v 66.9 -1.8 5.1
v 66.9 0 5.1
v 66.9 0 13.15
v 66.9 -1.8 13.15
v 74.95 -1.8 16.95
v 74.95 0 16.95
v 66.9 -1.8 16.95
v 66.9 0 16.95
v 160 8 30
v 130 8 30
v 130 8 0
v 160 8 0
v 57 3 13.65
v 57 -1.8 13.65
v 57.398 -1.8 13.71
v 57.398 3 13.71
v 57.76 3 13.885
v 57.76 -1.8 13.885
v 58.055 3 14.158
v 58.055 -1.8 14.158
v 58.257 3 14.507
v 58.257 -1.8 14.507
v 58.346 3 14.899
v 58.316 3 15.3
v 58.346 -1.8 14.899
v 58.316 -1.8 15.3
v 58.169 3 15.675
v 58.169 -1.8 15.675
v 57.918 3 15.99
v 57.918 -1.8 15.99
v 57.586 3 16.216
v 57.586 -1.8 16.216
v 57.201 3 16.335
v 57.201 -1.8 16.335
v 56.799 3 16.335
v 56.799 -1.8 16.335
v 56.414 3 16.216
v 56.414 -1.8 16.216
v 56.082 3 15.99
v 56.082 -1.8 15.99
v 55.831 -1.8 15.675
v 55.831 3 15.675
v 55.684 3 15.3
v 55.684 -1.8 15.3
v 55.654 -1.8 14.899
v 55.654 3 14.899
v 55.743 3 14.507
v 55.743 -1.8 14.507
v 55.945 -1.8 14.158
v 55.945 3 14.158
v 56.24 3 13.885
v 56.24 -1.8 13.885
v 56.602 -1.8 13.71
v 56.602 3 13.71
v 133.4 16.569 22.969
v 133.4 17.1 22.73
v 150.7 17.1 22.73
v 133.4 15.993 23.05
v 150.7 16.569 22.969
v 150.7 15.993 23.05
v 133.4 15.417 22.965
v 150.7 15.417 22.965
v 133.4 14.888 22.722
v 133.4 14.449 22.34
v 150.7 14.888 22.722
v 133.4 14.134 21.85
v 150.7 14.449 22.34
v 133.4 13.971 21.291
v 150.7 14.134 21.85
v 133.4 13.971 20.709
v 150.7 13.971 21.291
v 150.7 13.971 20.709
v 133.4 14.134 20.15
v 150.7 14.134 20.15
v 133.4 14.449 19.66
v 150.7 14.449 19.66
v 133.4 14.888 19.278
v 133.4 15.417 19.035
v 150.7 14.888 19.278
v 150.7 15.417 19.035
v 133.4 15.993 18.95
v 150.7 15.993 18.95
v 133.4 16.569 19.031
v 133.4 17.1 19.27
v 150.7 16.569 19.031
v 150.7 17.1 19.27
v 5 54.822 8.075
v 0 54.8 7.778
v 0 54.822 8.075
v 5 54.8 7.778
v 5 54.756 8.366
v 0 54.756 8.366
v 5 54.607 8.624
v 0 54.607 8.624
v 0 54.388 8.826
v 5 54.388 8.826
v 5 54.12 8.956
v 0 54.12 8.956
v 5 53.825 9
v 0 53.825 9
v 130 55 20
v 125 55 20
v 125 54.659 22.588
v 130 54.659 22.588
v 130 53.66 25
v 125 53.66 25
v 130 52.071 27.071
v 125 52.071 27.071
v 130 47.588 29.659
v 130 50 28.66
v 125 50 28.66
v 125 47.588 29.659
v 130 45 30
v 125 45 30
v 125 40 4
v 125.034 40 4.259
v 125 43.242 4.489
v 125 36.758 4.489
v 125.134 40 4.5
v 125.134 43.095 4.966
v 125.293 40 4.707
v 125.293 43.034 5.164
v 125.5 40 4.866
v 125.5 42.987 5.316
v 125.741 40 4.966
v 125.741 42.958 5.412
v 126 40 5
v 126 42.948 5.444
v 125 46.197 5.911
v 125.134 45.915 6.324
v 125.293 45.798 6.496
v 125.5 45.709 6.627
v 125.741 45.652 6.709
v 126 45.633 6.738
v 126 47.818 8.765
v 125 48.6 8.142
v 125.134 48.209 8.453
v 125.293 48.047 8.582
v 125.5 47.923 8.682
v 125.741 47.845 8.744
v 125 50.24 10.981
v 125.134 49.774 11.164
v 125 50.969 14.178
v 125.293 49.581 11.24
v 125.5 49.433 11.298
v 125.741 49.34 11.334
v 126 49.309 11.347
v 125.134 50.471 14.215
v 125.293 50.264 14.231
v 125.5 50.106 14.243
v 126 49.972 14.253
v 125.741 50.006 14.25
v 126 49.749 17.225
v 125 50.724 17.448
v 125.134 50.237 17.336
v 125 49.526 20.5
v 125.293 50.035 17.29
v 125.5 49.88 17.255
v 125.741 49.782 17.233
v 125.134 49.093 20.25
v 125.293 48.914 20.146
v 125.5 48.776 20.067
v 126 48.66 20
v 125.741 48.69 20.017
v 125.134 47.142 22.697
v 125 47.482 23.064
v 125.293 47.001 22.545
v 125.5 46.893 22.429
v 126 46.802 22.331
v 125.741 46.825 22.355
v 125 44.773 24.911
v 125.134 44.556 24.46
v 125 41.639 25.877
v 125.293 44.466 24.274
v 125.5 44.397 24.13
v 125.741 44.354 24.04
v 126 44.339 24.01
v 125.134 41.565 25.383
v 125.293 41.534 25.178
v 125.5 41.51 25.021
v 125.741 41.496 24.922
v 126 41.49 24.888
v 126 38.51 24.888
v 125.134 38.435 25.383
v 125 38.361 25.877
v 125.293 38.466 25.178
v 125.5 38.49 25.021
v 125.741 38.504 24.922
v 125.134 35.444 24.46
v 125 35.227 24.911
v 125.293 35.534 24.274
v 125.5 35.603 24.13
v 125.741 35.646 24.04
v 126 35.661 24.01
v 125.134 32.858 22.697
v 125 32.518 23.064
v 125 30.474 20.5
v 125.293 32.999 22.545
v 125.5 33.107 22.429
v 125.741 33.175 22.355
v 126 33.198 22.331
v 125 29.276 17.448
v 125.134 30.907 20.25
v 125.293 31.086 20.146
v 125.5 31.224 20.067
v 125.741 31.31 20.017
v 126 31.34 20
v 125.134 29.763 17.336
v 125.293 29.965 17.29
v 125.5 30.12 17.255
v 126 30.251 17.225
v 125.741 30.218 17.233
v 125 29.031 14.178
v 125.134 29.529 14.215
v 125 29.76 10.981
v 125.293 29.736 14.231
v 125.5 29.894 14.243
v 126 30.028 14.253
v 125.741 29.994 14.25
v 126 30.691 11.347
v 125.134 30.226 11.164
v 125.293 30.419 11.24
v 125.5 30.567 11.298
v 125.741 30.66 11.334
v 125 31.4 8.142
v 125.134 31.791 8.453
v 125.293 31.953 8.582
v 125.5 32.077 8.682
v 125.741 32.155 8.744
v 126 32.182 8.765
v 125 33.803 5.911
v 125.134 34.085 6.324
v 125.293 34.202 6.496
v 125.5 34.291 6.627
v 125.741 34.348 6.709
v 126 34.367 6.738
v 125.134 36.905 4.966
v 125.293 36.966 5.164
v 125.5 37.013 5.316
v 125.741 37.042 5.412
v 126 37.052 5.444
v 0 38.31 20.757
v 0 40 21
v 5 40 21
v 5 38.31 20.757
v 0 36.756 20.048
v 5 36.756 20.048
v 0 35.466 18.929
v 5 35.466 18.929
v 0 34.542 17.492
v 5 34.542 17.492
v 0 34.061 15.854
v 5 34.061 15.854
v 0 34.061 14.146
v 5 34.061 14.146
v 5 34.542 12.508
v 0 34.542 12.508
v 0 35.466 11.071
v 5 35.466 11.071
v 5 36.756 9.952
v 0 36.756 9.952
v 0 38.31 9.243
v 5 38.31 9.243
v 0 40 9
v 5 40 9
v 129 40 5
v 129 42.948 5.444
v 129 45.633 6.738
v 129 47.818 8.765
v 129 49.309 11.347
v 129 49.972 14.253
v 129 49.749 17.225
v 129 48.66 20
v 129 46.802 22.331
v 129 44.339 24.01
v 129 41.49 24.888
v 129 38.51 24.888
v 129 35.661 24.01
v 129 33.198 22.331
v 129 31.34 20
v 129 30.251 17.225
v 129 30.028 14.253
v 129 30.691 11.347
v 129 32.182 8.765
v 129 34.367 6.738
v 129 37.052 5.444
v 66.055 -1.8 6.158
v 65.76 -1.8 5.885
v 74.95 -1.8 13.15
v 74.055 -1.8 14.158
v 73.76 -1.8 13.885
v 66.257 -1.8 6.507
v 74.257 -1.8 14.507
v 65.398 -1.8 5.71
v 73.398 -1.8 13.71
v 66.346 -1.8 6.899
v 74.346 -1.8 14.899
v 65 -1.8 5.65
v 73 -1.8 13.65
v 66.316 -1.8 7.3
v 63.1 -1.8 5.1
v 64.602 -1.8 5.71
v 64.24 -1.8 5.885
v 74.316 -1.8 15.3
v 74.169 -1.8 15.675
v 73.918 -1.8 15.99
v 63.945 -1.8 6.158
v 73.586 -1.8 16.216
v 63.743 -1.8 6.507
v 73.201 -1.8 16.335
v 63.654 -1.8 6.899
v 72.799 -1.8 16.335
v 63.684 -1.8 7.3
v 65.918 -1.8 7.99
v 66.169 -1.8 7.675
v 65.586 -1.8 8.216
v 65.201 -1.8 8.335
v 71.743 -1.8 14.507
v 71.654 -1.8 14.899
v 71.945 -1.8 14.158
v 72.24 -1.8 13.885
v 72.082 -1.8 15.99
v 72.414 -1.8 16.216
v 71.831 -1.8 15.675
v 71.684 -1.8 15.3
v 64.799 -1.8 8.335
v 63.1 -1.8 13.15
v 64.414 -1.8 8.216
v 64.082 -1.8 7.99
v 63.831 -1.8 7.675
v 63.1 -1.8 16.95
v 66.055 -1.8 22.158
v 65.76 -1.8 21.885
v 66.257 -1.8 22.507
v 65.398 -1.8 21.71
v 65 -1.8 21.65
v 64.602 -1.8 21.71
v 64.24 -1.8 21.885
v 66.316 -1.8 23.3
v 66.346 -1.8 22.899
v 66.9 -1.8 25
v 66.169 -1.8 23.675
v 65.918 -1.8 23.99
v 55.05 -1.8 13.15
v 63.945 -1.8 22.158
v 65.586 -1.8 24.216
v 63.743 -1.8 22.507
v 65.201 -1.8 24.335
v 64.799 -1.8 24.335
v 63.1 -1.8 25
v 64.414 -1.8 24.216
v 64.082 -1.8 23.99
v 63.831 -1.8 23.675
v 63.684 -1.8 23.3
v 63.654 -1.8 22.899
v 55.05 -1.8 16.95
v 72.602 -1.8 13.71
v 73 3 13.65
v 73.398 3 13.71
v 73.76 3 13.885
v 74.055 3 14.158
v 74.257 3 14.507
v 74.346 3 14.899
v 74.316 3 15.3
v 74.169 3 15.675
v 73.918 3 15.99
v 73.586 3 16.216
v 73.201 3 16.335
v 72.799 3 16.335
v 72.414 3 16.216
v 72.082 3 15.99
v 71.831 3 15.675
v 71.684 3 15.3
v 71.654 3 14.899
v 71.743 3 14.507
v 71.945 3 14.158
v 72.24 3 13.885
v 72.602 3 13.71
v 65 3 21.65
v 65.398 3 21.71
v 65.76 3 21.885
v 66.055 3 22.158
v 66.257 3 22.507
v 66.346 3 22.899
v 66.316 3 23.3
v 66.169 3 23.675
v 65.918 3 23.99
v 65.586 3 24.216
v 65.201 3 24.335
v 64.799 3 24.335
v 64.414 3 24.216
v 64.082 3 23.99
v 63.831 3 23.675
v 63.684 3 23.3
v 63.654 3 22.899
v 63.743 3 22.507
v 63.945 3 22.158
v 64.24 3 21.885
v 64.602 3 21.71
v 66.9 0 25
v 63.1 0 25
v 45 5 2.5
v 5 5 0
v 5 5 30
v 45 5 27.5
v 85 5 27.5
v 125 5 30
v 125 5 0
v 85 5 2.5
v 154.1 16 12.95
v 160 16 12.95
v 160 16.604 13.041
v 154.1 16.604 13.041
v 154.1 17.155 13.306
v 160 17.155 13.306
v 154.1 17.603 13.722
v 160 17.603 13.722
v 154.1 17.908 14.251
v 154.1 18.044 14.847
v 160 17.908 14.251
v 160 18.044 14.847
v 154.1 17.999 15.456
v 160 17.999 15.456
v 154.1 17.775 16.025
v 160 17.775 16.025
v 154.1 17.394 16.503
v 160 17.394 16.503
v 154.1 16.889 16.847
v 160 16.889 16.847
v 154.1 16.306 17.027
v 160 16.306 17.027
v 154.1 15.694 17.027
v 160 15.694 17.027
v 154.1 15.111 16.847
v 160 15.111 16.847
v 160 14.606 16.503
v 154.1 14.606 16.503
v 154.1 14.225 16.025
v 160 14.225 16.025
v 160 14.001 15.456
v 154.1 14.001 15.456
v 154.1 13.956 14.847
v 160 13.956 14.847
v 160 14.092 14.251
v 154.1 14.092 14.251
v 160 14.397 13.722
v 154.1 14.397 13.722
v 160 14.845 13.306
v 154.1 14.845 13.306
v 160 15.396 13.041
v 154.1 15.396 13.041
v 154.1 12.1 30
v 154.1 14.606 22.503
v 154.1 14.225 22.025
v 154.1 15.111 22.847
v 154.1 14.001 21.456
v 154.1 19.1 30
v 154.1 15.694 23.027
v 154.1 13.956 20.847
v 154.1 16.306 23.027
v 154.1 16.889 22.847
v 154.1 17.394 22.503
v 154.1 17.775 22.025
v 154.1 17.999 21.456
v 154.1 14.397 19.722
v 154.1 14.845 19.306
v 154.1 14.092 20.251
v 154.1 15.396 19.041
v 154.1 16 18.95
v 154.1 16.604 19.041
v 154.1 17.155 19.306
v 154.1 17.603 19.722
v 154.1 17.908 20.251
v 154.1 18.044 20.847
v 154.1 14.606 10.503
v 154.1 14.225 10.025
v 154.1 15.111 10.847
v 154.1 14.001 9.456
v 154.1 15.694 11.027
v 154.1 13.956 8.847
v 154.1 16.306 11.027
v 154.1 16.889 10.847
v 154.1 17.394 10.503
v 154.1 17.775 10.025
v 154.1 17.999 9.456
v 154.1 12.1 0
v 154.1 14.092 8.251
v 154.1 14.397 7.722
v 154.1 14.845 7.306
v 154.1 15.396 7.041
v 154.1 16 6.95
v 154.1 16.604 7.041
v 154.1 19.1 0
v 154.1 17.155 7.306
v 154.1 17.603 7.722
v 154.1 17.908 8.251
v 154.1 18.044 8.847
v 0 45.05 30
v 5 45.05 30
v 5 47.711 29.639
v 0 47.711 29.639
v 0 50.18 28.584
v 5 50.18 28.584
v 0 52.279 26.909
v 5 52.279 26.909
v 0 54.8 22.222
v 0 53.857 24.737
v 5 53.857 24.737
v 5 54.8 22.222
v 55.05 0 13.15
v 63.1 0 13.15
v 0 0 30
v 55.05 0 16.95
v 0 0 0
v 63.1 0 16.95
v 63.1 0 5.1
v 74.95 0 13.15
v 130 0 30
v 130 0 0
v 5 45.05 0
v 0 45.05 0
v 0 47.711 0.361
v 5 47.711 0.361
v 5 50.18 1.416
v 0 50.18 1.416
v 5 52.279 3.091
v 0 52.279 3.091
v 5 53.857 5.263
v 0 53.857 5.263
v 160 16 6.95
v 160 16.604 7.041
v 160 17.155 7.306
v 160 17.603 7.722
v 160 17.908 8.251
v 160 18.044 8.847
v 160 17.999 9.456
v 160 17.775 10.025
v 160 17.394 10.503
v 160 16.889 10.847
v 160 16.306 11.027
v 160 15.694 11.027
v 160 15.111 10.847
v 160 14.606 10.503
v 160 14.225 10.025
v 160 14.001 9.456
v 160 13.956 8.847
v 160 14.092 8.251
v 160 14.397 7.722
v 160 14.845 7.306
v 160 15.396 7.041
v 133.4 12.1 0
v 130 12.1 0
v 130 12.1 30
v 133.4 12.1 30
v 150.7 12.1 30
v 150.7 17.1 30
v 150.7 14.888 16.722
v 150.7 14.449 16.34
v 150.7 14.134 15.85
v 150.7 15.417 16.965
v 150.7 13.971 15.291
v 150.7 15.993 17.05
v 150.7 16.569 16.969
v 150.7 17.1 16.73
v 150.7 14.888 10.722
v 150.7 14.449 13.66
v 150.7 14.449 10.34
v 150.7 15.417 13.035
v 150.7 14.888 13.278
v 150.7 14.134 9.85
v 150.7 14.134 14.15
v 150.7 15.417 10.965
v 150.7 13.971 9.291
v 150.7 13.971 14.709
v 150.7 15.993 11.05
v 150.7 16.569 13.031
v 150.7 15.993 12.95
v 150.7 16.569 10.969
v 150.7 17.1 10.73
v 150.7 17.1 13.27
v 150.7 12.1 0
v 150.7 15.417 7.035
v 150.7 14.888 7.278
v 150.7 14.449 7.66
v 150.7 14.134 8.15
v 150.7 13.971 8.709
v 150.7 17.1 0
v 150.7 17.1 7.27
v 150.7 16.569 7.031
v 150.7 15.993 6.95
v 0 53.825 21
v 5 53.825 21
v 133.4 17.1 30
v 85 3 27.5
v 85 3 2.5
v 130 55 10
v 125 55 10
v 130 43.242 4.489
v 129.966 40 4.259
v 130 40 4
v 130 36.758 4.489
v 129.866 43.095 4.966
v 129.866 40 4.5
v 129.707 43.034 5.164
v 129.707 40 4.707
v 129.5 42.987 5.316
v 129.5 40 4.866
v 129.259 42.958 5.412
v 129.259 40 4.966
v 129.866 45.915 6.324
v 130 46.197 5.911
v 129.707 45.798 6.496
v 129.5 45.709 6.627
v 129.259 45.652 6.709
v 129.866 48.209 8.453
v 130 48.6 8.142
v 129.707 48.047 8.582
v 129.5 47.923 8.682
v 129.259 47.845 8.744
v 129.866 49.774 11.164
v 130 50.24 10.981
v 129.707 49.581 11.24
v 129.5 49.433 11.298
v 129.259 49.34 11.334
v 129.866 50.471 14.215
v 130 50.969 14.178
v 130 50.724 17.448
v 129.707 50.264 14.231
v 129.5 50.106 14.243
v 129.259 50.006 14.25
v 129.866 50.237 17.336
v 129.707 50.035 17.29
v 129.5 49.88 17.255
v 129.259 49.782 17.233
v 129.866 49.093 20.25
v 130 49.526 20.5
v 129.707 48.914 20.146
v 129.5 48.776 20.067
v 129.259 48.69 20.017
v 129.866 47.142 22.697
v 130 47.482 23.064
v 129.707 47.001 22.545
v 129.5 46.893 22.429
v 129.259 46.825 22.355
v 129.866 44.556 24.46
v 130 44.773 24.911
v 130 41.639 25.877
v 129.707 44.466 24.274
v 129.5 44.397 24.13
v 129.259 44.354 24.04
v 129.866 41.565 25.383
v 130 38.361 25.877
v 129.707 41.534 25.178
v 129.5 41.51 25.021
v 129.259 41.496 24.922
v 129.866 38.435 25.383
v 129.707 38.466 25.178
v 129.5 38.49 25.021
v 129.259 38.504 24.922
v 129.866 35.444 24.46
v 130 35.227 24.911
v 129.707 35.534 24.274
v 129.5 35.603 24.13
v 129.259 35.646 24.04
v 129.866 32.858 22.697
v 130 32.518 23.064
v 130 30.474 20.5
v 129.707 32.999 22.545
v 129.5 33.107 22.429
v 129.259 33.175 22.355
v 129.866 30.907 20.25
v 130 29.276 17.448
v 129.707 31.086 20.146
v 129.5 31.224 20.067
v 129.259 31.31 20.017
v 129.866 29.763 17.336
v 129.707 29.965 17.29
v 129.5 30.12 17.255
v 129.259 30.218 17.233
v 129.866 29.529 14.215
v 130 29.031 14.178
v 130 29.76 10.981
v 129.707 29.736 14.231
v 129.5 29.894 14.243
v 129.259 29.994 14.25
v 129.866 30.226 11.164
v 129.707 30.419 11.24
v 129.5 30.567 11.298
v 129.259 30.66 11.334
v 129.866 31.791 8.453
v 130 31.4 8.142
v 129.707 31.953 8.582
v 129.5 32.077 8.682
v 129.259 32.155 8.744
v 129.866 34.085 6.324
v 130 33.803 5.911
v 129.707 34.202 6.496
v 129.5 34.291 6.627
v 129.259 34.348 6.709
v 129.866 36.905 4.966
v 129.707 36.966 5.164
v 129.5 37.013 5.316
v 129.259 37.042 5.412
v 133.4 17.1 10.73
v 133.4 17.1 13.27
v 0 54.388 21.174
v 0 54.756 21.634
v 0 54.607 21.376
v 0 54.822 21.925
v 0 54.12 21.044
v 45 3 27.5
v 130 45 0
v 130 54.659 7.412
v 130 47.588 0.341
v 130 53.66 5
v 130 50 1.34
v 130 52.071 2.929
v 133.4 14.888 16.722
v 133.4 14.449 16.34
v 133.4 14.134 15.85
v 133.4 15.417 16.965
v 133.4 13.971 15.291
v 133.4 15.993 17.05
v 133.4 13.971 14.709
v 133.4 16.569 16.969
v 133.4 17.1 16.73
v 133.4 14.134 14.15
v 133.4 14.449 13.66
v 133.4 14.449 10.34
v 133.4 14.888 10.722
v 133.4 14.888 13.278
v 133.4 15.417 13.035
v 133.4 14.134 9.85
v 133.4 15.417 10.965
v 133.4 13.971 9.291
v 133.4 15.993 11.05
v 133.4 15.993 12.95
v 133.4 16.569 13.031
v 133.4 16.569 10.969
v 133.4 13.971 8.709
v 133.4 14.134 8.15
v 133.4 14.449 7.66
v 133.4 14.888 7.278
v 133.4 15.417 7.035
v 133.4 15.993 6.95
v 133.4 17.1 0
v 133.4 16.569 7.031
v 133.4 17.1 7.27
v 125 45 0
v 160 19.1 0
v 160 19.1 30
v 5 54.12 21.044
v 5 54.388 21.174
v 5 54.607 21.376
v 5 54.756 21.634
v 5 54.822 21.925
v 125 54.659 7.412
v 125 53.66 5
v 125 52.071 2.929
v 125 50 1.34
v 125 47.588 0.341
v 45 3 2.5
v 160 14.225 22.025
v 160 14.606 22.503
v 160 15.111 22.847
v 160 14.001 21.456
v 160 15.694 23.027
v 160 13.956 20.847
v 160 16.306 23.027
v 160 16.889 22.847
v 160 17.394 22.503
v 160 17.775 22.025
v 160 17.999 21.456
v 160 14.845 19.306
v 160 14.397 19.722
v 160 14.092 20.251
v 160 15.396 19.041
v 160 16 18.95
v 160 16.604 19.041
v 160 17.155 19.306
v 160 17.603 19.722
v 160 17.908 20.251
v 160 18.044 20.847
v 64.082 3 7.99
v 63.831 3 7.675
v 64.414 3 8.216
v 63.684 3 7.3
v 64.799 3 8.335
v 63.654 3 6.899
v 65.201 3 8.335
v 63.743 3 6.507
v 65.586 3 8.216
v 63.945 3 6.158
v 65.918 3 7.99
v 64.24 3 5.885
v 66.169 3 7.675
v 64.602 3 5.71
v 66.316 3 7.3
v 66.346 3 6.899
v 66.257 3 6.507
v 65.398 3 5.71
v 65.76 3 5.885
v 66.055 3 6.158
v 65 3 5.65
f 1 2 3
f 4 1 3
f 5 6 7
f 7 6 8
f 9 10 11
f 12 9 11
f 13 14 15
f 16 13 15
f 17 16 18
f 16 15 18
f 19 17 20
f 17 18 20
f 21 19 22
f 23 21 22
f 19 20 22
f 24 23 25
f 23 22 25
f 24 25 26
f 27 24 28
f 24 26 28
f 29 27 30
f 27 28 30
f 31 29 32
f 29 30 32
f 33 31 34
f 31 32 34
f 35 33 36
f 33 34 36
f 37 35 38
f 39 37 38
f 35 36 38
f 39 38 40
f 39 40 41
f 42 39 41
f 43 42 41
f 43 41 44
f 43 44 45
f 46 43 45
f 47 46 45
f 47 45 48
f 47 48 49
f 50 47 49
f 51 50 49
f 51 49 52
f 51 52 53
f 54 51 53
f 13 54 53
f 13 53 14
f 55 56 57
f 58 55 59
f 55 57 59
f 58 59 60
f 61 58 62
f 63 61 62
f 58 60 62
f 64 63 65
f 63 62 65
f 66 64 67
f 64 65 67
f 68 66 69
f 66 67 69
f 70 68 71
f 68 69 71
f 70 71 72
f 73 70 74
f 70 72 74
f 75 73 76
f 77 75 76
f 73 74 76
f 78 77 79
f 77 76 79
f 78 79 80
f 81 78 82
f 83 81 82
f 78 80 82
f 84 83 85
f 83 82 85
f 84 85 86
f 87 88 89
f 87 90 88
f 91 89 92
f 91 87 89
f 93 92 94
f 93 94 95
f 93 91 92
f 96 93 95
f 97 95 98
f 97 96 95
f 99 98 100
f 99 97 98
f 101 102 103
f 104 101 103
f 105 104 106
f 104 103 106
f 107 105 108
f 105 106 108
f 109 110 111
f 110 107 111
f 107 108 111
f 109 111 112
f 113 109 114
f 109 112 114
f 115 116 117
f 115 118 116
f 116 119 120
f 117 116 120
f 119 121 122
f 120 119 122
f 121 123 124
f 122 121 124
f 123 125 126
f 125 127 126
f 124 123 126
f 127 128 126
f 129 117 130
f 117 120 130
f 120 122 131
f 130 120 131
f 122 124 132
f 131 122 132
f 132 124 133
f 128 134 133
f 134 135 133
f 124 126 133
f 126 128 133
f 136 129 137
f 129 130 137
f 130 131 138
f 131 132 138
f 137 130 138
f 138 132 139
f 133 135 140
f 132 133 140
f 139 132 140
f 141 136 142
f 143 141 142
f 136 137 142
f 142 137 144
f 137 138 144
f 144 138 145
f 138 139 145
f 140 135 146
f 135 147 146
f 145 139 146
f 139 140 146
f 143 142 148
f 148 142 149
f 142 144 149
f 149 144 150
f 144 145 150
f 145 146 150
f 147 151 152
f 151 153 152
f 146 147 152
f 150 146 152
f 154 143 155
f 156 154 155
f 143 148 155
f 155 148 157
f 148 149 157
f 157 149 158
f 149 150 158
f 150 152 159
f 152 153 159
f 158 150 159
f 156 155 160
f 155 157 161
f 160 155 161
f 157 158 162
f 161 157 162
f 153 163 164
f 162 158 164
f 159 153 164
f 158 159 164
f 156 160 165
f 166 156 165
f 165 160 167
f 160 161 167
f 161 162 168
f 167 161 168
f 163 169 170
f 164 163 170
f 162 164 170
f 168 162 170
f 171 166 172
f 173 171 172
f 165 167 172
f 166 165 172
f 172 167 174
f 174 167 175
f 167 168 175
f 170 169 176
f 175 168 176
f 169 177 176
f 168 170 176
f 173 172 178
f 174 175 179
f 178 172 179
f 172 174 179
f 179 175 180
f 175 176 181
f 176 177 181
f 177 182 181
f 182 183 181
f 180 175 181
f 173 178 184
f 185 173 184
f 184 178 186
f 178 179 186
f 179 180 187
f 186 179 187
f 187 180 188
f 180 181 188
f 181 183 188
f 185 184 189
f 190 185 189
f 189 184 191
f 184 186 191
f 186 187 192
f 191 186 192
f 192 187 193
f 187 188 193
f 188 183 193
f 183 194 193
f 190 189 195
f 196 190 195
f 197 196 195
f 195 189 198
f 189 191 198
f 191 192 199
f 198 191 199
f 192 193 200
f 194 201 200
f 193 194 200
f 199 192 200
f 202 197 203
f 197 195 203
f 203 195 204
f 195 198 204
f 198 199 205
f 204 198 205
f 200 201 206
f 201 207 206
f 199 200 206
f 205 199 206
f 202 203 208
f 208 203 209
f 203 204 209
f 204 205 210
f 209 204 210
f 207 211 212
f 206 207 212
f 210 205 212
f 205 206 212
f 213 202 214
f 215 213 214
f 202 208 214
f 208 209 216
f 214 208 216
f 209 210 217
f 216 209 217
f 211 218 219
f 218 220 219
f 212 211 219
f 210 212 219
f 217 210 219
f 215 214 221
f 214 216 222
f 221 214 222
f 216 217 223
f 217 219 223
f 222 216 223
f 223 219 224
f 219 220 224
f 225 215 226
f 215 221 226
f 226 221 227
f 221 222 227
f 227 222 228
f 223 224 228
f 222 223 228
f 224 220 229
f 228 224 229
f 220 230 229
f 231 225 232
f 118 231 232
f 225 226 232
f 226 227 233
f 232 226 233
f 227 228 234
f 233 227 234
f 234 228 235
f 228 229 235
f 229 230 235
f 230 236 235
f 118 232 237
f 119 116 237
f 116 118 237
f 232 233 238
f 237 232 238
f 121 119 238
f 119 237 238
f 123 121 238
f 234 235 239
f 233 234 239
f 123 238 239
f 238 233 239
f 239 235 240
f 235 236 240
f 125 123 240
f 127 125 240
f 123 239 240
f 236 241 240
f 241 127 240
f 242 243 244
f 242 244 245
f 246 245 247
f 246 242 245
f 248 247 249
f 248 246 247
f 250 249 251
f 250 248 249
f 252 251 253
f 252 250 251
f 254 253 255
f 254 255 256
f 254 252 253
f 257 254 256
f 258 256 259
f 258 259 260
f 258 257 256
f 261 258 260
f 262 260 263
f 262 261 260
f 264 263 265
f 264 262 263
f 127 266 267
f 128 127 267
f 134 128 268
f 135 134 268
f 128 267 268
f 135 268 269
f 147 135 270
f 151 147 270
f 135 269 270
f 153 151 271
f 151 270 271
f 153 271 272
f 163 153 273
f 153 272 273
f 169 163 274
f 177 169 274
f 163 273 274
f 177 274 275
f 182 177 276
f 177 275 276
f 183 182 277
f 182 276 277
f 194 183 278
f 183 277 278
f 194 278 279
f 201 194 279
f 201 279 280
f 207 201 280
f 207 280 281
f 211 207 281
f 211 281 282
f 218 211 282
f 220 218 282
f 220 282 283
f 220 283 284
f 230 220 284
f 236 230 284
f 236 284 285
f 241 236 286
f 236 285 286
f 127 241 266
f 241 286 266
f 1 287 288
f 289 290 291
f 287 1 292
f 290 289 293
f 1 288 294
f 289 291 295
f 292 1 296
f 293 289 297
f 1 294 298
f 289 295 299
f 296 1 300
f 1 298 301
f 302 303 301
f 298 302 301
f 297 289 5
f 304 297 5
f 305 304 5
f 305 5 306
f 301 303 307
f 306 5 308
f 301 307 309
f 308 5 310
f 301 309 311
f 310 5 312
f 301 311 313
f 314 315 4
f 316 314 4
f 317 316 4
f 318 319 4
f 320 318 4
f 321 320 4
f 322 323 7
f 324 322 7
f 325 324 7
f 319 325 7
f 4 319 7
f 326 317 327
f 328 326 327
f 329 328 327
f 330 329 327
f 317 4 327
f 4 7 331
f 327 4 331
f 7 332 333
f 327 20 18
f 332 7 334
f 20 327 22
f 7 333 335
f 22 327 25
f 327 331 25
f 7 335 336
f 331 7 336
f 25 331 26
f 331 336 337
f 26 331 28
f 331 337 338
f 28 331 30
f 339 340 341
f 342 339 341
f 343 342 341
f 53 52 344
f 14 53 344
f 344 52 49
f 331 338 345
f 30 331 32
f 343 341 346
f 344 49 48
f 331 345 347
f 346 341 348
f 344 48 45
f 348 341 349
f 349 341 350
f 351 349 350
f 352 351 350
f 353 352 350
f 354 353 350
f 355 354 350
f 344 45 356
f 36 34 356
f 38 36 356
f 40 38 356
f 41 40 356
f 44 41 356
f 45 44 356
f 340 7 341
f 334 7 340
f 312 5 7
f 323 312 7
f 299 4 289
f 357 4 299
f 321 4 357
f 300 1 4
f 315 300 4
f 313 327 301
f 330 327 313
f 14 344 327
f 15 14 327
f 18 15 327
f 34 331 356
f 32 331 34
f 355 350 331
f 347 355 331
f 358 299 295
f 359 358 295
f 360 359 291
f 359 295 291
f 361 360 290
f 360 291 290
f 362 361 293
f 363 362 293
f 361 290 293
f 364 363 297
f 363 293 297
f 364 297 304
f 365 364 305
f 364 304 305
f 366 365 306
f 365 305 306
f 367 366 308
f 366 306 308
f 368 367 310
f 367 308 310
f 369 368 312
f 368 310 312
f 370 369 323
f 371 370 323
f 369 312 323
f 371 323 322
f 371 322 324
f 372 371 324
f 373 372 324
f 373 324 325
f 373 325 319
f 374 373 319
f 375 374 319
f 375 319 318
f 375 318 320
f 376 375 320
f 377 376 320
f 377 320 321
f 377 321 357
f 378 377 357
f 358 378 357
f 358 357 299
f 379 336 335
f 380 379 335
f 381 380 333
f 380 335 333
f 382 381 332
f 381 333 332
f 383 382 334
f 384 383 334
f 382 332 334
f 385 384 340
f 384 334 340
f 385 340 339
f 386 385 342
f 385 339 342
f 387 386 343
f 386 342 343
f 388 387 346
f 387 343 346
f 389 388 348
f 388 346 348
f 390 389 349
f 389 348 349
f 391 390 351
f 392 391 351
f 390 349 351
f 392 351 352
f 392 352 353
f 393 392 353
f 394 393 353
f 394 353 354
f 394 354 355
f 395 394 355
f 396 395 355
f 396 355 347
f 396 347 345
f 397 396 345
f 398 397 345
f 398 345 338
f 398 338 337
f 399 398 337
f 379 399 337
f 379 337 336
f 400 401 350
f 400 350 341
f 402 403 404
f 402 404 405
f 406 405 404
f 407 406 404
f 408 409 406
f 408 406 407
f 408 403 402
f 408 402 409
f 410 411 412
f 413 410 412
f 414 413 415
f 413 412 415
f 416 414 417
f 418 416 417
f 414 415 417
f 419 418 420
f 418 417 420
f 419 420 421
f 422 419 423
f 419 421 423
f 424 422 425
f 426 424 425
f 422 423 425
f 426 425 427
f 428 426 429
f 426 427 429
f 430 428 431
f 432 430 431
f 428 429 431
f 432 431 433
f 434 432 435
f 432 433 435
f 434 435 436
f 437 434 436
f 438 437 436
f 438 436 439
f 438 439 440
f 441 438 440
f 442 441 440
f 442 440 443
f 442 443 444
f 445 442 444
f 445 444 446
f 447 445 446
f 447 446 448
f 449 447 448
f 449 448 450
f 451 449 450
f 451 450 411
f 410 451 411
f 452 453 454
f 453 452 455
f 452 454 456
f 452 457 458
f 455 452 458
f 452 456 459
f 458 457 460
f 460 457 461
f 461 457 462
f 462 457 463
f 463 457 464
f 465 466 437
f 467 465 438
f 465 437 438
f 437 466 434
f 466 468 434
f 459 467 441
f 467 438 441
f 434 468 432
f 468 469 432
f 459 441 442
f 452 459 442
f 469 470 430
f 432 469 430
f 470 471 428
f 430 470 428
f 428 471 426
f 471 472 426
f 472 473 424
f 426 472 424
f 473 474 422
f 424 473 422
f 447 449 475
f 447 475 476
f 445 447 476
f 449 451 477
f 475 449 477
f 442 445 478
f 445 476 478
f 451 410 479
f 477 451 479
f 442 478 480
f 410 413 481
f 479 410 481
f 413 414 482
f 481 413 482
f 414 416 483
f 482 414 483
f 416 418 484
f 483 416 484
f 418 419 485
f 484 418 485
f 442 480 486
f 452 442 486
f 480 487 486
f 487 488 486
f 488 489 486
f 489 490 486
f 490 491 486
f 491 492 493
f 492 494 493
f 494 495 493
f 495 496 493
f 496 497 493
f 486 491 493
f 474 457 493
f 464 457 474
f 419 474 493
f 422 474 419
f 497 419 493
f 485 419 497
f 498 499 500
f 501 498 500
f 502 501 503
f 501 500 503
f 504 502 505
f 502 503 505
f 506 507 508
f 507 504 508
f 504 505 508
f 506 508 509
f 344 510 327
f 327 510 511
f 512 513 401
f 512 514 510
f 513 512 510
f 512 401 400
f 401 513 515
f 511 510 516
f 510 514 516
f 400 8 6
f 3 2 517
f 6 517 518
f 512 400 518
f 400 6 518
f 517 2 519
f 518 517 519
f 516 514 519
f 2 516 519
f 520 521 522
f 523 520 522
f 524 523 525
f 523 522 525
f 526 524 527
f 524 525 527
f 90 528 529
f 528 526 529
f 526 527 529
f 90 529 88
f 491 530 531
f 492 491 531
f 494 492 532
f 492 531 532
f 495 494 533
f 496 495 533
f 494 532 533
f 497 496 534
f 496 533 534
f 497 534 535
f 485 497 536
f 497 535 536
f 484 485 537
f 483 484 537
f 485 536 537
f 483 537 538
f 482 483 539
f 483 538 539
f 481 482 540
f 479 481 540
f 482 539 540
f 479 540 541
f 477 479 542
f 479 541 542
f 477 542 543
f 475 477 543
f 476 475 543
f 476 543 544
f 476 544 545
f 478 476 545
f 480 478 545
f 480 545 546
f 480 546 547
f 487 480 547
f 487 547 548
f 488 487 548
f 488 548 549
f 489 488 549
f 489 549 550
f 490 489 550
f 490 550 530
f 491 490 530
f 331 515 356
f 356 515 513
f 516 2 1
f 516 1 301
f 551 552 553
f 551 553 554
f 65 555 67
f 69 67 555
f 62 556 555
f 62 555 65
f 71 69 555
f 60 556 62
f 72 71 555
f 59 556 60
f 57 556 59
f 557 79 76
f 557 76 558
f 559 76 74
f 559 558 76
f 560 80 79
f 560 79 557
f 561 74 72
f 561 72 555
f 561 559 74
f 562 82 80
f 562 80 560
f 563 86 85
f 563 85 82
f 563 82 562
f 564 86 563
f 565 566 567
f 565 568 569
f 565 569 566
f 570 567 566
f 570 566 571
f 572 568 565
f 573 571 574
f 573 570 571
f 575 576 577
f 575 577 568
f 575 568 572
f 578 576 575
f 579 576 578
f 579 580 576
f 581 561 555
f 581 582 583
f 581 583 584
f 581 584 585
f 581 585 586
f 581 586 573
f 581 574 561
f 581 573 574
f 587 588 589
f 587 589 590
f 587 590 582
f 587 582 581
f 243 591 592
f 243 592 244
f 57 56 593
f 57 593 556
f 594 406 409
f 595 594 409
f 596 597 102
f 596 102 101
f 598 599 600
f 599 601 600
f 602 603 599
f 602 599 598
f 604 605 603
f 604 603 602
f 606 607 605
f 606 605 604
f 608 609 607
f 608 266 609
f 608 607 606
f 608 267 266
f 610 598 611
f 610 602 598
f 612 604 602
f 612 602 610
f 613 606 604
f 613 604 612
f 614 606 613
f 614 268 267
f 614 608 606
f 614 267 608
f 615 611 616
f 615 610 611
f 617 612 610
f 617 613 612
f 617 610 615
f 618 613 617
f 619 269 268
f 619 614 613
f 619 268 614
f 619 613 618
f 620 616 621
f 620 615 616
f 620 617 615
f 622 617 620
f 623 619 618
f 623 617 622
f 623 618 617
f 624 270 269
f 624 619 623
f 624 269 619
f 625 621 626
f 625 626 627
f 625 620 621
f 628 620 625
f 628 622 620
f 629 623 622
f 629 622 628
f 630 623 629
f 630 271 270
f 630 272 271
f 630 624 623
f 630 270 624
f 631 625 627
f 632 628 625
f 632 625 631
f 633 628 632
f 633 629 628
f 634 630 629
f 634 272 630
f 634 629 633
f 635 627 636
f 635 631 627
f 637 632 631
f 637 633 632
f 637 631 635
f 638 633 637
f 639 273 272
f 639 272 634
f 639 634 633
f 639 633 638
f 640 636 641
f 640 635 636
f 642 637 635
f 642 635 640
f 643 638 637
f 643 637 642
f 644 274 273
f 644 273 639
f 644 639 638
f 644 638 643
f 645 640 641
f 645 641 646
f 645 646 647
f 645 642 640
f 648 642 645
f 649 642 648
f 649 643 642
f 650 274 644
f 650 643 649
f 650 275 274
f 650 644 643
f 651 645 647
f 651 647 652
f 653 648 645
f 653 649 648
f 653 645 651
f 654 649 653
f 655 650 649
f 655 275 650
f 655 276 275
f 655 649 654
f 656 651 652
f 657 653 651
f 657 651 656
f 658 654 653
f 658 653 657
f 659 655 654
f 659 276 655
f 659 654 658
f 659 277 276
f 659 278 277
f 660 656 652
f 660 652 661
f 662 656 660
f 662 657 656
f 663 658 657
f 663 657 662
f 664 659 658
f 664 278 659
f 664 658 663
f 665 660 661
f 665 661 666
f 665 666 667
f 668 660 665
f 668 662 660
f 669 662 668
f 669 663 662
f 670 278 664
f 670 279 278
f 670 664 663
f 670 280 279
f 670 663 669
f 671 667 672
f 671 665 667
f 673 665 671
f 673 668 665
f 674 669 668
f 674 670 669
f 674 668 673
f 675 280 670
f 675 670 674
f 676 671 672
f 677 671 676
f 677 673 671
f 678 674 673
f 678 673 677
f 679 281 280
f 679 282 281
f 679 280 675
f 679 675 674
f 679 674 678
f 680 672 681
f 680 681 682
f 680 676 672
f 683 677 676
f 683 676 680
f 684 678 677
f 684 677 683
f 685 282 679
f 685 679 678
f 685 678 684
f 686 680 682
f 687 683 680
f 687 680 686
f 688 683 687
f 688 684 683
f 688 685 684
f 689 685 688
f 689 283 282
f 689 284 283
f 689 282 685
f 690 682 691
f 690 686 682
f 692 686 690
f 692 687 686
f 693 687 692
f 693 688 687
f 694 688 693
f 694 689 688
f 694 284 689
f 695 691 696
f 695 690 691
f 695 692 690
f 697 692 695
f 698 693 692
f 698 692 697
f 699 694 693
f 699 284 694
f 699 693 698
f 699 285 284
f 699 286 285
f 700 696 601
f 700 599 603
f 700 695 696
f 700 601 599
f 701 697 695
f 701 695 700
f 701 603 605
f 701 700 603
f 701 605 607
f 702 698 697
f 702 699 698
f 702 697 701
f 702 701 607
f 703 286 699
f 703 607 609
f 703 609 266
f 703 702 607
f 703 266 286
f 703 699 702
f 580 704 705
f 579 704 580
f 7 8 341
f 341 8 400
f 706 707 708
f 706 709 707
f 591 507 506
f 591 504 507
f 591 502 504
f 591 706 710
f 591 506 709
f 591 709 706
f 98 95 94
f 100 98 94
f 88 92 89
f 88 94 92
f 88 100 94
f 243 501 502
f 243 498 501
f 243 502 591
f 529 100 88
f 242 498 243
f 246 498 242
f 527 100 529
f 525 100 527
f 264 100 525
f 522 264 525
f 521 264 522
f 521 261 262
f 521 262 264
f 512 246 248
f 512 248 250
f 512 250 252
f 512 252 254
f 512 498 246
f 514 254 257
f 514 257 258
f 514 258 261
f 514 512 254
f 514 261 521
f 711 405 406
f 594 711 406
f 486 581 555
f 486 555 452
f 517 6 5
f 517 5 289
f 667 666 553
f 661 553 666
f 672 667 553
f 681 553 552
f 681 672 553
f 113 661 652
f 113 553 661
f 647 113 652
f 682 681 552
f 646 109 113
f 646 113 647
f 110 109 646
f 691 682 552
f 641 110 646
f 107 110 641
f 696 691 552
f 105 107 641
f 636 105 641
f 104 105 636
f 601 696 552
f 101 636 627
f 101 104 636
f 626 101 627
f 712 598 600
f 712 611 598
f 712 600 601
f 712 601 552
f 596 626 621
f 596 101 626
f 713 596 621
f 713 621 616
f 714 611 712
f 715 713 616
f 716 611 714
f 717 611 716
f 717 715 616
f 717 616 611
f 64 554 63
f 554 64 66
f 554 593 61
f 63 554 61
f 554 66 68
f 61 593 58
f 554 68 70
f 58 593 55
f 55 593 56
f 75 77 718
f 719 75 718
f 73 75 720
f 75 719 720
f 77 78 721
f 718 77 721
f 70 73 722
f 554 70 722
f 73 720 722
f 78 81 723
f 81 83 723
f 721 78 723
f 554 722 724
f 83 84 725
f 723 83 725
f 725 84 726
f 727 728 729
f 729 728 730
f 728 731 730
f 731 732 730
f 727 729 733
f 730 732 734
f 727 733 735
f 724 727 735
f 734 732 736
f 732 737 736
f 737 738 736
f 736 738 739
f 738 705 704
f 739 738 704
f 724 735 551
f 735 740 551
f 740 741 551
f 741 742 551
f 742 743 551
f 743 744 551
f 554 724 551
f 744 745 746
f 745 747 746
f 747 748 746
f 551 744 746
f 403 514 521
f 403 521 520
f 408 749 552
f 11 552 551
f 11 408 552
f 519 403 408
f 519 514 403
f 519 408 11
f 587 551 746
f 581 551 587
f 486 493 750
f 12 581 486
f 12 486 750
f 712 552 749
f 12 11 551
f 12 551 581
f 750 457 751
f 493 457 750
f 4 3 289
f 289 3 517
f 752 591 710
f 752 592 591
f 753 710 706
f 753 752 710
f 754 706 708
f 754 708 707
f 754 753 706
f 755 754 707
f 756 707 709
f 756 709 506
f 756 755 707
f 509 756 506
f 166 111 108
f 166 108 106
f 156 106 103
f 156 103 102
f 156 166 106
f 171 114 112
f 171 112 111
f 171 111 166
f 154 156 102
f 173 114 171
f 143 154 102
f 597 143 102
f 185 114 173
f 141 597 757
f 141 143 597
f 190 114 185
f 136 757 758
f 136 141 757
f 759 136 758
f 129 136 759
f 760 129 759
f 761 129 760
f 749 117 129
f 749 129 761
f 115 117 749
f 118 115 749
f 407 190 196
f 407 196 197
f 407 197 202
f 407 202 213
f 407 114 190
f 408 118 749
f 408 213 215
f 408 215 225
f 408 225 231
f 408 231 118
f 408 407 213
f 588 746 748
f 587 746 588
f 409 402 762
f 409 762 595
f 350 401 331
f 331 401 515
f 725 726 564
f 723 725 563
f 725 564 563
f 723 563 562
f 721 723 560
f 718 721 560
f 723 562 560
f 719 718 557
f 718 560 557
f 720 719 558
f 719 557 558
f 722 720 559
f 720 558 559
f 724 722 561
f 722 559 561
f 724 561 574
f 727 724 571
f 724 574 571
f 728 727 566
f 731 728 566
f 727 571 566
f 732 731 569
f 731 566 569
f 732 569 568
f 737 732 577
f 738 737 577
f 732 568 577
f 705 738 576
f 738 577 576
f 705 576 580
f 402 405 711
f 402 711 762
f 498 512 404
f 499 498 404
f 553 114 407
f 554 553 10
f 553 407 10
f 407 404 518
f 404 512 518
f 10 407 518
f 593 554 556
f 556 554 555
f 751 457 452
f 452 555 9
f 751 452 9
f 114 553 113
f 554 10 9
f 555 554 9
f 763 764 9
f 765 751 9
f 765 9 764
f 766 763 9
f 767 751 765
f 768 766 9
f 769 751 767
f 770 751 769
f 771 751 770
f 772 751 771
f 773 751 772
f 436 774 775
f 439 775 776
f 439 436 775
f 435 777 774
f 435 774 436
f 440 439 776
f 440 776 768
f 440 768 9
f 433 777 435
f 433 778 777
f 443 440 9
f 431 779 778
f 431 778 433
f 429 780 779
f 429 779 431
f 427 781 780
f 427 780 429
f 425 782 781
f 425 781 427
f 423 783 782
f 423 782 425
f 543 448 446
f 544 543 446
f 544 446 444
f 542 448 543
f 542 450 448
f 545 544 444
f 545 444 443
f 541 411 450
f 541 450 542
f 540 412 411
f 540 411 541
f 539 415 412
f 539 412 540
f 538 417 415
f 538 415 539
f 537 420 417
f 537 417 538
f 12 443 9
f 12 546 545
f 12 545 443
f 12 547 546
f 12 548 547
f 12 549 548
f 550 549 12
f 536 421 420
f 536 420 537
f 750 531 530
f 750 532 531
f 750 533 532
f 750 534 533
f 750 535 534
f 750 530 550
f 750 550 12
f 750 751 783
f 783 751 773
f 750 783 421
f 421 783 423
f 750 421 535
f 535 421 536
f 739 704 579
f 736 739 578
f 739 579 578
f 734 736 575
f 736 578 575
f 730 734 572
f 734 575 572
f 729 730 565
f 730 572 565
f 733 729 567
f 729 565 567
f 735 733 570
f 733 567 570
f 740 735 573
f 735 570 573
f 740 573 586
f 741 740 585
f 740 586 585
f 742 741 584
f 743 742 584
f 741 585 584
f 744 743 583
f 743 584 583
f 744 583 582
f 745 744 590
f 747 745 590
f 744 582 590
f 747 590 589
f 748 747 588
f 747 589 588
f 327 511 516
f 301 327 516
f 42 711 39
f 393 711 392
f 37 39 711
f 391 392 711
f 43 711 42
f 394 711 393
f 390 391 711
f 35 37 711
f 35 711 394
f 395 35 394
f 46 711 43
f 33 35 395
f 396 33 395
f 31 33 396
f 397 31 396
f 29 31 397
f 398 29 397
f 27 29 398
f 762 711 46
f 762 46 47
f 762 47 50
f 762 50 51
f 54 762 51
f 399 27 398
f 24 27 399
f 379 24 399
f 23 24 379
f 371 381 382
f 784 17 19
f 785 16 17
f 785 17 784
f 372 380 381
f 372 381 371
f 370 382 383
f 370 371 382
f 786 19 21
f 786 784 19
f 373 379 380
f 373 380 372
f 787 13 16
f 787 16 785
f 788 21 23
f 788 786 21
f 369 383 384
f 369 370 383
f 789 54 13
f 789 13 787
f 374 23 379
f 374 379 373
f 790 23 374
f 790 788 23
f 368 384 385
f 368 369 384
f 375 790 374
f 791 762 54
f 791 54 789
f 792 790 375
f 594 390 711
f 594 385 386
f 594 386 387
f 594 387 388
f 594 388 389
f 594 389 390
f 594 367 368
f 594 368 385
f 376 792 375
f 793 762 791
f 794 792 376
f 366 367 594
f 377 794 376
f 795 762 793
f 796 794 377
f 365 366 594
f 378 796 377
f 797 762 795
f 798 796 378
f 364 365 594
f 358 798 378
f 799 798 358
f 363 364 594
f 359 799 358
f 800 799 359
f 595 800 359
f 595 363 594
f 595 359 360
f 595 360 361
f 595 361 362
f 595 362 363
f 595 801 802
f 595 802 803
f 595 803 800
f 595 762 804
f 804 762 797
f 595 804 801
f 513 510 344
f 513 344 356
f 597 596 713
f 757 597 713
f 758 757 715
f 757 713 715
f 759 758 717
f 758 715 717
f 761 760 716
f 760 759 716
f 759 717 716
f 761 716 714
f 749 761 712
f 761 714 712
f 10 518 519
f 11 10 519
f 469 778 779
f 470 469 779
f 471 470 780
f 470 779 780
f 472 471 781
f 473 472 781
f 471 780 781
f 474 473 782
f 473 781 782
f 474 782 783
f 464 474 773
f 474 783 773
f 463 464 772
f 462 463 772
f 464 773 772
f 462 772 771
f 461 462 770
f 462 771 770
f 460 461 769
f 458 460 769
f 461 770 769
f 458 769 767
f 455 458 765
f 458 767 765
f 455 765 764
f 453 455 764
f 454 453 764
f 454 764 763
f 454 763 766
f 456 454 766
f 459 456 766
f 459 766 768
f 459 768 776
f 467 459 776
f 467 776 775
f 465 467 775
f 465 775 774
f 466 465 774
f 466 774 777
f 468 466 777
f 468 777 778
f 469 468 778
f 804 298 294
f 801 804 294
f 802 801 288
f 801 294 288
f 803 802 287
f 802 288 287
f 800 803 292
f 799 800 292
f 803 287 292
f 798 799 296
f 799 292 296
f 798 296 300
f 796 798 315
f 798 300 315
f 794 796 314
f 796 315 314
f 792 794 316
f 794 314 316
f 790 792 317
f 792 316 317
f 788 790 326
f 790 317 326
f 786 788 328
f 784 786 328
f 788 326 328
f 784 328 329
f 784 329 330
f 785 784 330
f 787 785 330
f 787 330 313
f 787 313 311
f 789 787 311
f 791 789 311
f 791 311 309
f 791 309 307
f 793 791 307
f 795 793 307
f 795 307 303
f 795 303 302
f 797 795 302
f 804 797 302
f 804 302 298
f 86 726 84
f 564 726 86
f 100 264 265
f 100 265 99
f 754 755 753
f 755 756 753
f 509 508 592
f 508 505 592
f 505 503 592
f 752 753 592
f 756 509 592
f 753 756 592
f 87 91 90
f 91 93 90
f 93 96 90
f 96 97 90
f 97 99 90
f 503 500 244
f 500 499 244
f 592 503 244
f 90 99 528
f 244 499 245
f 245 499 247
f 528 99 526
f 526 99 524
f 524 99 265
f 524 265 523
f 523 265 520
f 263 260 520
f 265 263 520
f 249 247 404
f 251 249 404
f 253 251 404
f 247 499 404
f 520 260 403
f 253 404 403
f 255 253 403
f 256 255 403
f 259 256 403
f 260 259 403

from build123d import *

# Parameters (mm, degrees)
SKETCH1_W           = 130
SKETCH1_H           = 30
BOSS_EXTRUDE1_DEPTH = 5
BOSS_EXTRUDE3_DEPTH = 1.8
SKETCH6_W           = 40
SKETCH6_H           = 25
CUT_EXTRUDE2_DEPTH  = 2
SKETCH5_R           = 1.35
CUT_EXTRUDE3_DEPTH  = 6
SKETCH8_W           = 5
SKETCH8_H           = 30
BOSS_EXTRUDE4_DEPTH = 50
SKETCH9_R           = 10
CUT_EXTRUDE4_DEPTH  = 5
SKETCH10_W          = 30
SKETCH10_H          = 11.1
BOSS_EXTRUDE5_DEPTH = 30
SKETCH11_W          = 3.4
SKETCH11_H          = 30
CUT_EXTRUDE5_DEPTH  = 7
CUT_EXTRUDE6_REACH  = 173.828
SKETCH12_R          = 2.05
CUT_EXTRUDE7_DEPTH  = 5
SKETCH14_W          = 17.3
SKETCH14_H          = 30
CUT_EXTRUDE8_DEPTH  = 2
FILLET1_R           = 10
FILLET3_R           = 1
FILLET6_R           = 1


with BuildPart() as part:
    # Sketch1 → Boss-Extrude1 (new body)
    with BuildSketch(Plane(origin=(0, 0, 0), x_dir=(1, 0, 0), z_dir=(0, 1, 0))):
        with Locations((65, -15)):
            Rectangle(SKETCH1_W, SKETCH1_H)
    extrude(amount=BOSS_EXTRUDE1_DEPTH)

    # Sketch4 → Boss-Extrude3 (add)
    with BuildSketch(Plane.XZ):
        Polygon((63.1, 25), (66.9, 25), (66.9, 17), (66.9, 16.95), (67.95, 16.95), (74.95, 16.95), (74.95, 13.15), (66.95, 13.15), (66.9, 13.15), (66.9, 12.1), (66.9, 5.1), (63.1, 5.1), (63.1, 13.1), (63.1, 13.15), (62.05, 13.15), (55.05, 13.15), (55.05, 16.95), (63.05, 16.95), (63.1, 16.95), (63.1, 18), align=None)
    extrude(amount=BOSS_EXTRUDE3_DEPTH)

    # Sketch6 → Cut-Extrude2 (cut)
    with BuildSketch(Plane(origin=(0, 5, 0), x_dir=(1, 0, 0), z_dir=(0, 1, 0))):
        with Locations((65, -15)):
            Rectangle(SKETCH6_W, SKETCH6_H)
    extrude(amount=-CUT_EXTRUDE2_DEPTH, mode=Mode.SUBTRACT)

    # Sketch5 → Cut-Extrude3 (cut)
    with BuildSketch(Plane.XZ.offset(1.8)):
        with Locations(Location((65, 23, 0), (0, 0, 270))):
            Circle(SKETCH5_R)
        with Locations(Location((73, 15, 0), (0, 0, 270))):
            Circle(SKETCH5_R)
        with Locations(Location((57, 15, 0), (0, 0, 270))):
            Circle(SKETCH5_R)
        with Locations(Location((65, 7, 0), (0, 0, 270))):
            Circle(SKETCH5_R)
    extrude(amount=-CUT_EXTRUDE3_DEPTH, mode=Mode.SUBTRACT)

    # Sketch8 → Boss-Extrude4 (add)
    with BuildSketch(Plane(origin=(0, 5, 0), x_dir=(1, 0, 0), z_dir=(0, 1, 0))):
        with Locations((2.5, -15)):
            Rectangle(SKETCH8_W, SKETCH8_H)
        with Locations((127.5, -15)):
            Rectangle(SKETCH8_W, SKETCH8_H)
    extrude(amount=BOSS_EXTRUDE4_DEPTH)

    # Sketch9 → Cut-Extrude4 (cut)
    with BuildSketch(Plane(origin=(130, 0, 0), x_dir=(0, 0, -1), z_dir=(1, 0, 0))):
        with Locations((-15, 40)):
            Circle(SKETCH9_R)
    extrude(amount=-CUT_EXTRUDE4_DEPTH, mode=Mode.SUBTRACT)

    # Sketch10 → Boss-Extrude5 (add)
    with BuildSketch(Plane(origin=(130, 0, 0), x_dir=(0, 0, -1), z_dir=(1, 0, 0))):
        with Locations((-15, 13.55)):
            Rectangle(SKETCH10_W, SKETCH10_H)
    extrude(amount=BOSS_EXTRUDE5_DEPTH)

    # Sketch11 → Cut-Extrude5 (cut)
    with BuildSketch(Plane(origin=(0, 19.1, 0), x_dir=(1, 0, 0), z_dir=(0, 1, 0))):
        with Locations((131.7, -15)):
            Rectangle(SKETCH11_W, SKETCH11_H)
        with Locations((152.4, -15)):
            Rectangle(SKETCH11_W, SKETCH11_H)
    extrude(amount=-CUT_EXTRUDE5_DEPTH, mode=Mode.SUBTRACT)

    # Cut-Extrude6: up to this face of the body (flat: up to its plane)
    cut_extrude6_end = Plane(part.part.faces().sort_by_distance((130, 12.623489255, 15))[0])
    # Sketch12 → Cut-Extrude6 (cut, up to the picked face)
    with BuildSketch(Plane(origin=(160, 0, 0), x_dir=(0, 0, -1), z_dir=(1, 0, 0)), mode=Mode.PRIVATE) as cut_extrude6_sk1:
        with Locations((-15, 16)):
            Circle(SKETCH12_R)
    cut_extrude6_tool1 = split(extrude(cut_extrude6_sk1.sketch, amount=-CUT_EXTRUDE6_REACH, mode=Mode.PRIVATE), bisect_by=cut_extrude6_end, keep=Keep.BOTH, mode=Mode.PRIVATE)
    # Sketch12 → Cut-Extrude6 (cut, up to the picked face)
    with BuildSketch(Plane(origin=(160, 0, 0), x_dir=(0, 0, -1), z_dir=(1, 0, 0)), mode=Mode.PRIVATE) as cut_extrude6_sk2:
        with Locations((-21, 16)):
            Circle(SKETCH12_R)
    cut_extrude6_tool2 = split(extrude(cut_extrude6_sk2.sketch, amount=-CUT_EXTRUDE6_REACH, mode=Mode.PRIVATE), bisect_by=cut_extrude6_end, keep=Keep.BOTH, mode=Mode.PRIVATE)
    # Sketch12 → Cut-Extrude6 (cut, up to the picked face)
    with BuildSketch(Plane(origin=(160, 0, 0), x_dir=(0, 0, -1), z_dir=(1, 0, 0)), mode=Mode.PRIVATE) as cut_extrude6_sk3:
        with Locations((-9, 16)):
            Circle(SKETCH12_R)
    cut_extrude6_tool3 = split(extrude(cut_extrude6_sk3.sketch, amount=-CUT_EXTRUDE6_REACH, mode=Mode.PRIVATE), bisect_by=cut_extrude6_end, keep=Keep.BOTH, mode=Mode.PRIVATE)
    add(cut_extrude6_tool1.solids().sort_by(Axis((160, 16, 15), (-1, 0, 0)))[0], mode=Mode.SUBTRACT)
    add(cut_extrude6_tool2.solids().sort_by(Axis((160, 16, 21), (-1, 0, 0)))[0], mode=Mode.SUBTRACT)
    add(cut_extrude6_tool3.solids().sort_by(Axis((160, 16, 9), (-1, 0, 0)))[0], mode=Mode.SUBTRACT)

    # Sketch13 → Cut-Extrude7 (cut)
    with BuildSketch(Plane.ZY):
        with BuildLine():
            Line((9, 40), (9, 55))
            Line((9, 55), (21, 55))
            Line((21, 55), (21, 40))
            ThreePointArc((21, 40), (15, 34), (9, 40))
        make_face()
    extrude(amount=-CUT_EXTRUDE7_DEPTH, mode=Mode.SUBTRACT)

    # Sketch14 → Cut-Extrude8 (cut)
    with BuildSketch(Plane(origin=(0, 19.1, 0), x_dir=(1, 0, 0), z_dir=(0, 1, 0))):
        with Locations((142.05, -15)):
            Rectangle(SKETCH14_W, SKETCH14_H)
    extrude(amount=-CUT_EXTRUDE8_DEPTH, mode=Mode.SUBTRACT)

    # Fillet1
    # the kernel refuses this fillet: 10 mm, written as the material it takes off along each edge
    with BuildSketch(Plane(origin=(-24.874685928, 55, 0), x_dir=(0, -1, 0), z_dir=(1, 0, 0)), Plane(origin=(29.874685928, 55, 30), x_dir=(0, -1, 0), z_dir=(-1, 0, 0))) as fillet1_piece_1:
        with BuildLine():
            CenterArc((9.949874371, -10), FILLET1_R, 90, 84.260829523)
            Line((0, -9), (-0.198997487, -8.98))
            ThreePointArc((-0.198997487, -8.98), (-0.2, -4.5), (-0.2, 0))
            Line((-0.2, 0), (0, 0.2))
            Line((0, 0.2), (9.949874371, 0.2))
            Line((9.949874371, 0.2), (9.949874371, 0))
        make_face()
    extrude(amount=54.749371855, mode=Mode.SUBTRACT)
    with BuildSketch(Plane(origin=(155, 55, 0), x_dir=(0, -1, 0), z_dir=(-1, 0, 0)), Plane(origin=(100, 55, 30), x_dir=(0, -1, 0), z_dir=(1, 0, 0))) as fillet1_piece_2:
        with BuildLine():
            CenterArc((FILLET1_R, FILLET1_R), FILLET1_R, 180, 90)
            Line((0, FILLET1_R), (-FILLET1_R * 0.02, FILLET1_R))
            Line((-FILLET1_R * 0.02, FILLET1_R), (-FILLET1_R * 0.02, -FILLET1_R * 0.02))
            Line((-FILLET1_R * 0.02, -FILLET1_R * 0.02), (FILLET1_R, -FILLET1_R * 0.02))
            Line((FILLET1_R, -FILLET1_R * 0.02), (FILLET1_R, 0))
        make_face()
    extrude(amount=55, mode=Mode.SUBTRACT)

    # Fillet3
    fillet3_edges = [part.edges().sort_by_distance(p)[0] for p in [
        (2.5, 55, 9),
        (2.5, 55, 21),
    ]]
    fillet(fillet3_edges, radius=FILLET3_R)

    # Fillet6
    fillet6_edges = [part.edges().sort_by_distance(p)[0] for p in [
        (130, 40, 25),
        (125, 40, 25),
    ]]
    fillet(fillet6_edges, radius=FILLET6_R)


solid = part.part
